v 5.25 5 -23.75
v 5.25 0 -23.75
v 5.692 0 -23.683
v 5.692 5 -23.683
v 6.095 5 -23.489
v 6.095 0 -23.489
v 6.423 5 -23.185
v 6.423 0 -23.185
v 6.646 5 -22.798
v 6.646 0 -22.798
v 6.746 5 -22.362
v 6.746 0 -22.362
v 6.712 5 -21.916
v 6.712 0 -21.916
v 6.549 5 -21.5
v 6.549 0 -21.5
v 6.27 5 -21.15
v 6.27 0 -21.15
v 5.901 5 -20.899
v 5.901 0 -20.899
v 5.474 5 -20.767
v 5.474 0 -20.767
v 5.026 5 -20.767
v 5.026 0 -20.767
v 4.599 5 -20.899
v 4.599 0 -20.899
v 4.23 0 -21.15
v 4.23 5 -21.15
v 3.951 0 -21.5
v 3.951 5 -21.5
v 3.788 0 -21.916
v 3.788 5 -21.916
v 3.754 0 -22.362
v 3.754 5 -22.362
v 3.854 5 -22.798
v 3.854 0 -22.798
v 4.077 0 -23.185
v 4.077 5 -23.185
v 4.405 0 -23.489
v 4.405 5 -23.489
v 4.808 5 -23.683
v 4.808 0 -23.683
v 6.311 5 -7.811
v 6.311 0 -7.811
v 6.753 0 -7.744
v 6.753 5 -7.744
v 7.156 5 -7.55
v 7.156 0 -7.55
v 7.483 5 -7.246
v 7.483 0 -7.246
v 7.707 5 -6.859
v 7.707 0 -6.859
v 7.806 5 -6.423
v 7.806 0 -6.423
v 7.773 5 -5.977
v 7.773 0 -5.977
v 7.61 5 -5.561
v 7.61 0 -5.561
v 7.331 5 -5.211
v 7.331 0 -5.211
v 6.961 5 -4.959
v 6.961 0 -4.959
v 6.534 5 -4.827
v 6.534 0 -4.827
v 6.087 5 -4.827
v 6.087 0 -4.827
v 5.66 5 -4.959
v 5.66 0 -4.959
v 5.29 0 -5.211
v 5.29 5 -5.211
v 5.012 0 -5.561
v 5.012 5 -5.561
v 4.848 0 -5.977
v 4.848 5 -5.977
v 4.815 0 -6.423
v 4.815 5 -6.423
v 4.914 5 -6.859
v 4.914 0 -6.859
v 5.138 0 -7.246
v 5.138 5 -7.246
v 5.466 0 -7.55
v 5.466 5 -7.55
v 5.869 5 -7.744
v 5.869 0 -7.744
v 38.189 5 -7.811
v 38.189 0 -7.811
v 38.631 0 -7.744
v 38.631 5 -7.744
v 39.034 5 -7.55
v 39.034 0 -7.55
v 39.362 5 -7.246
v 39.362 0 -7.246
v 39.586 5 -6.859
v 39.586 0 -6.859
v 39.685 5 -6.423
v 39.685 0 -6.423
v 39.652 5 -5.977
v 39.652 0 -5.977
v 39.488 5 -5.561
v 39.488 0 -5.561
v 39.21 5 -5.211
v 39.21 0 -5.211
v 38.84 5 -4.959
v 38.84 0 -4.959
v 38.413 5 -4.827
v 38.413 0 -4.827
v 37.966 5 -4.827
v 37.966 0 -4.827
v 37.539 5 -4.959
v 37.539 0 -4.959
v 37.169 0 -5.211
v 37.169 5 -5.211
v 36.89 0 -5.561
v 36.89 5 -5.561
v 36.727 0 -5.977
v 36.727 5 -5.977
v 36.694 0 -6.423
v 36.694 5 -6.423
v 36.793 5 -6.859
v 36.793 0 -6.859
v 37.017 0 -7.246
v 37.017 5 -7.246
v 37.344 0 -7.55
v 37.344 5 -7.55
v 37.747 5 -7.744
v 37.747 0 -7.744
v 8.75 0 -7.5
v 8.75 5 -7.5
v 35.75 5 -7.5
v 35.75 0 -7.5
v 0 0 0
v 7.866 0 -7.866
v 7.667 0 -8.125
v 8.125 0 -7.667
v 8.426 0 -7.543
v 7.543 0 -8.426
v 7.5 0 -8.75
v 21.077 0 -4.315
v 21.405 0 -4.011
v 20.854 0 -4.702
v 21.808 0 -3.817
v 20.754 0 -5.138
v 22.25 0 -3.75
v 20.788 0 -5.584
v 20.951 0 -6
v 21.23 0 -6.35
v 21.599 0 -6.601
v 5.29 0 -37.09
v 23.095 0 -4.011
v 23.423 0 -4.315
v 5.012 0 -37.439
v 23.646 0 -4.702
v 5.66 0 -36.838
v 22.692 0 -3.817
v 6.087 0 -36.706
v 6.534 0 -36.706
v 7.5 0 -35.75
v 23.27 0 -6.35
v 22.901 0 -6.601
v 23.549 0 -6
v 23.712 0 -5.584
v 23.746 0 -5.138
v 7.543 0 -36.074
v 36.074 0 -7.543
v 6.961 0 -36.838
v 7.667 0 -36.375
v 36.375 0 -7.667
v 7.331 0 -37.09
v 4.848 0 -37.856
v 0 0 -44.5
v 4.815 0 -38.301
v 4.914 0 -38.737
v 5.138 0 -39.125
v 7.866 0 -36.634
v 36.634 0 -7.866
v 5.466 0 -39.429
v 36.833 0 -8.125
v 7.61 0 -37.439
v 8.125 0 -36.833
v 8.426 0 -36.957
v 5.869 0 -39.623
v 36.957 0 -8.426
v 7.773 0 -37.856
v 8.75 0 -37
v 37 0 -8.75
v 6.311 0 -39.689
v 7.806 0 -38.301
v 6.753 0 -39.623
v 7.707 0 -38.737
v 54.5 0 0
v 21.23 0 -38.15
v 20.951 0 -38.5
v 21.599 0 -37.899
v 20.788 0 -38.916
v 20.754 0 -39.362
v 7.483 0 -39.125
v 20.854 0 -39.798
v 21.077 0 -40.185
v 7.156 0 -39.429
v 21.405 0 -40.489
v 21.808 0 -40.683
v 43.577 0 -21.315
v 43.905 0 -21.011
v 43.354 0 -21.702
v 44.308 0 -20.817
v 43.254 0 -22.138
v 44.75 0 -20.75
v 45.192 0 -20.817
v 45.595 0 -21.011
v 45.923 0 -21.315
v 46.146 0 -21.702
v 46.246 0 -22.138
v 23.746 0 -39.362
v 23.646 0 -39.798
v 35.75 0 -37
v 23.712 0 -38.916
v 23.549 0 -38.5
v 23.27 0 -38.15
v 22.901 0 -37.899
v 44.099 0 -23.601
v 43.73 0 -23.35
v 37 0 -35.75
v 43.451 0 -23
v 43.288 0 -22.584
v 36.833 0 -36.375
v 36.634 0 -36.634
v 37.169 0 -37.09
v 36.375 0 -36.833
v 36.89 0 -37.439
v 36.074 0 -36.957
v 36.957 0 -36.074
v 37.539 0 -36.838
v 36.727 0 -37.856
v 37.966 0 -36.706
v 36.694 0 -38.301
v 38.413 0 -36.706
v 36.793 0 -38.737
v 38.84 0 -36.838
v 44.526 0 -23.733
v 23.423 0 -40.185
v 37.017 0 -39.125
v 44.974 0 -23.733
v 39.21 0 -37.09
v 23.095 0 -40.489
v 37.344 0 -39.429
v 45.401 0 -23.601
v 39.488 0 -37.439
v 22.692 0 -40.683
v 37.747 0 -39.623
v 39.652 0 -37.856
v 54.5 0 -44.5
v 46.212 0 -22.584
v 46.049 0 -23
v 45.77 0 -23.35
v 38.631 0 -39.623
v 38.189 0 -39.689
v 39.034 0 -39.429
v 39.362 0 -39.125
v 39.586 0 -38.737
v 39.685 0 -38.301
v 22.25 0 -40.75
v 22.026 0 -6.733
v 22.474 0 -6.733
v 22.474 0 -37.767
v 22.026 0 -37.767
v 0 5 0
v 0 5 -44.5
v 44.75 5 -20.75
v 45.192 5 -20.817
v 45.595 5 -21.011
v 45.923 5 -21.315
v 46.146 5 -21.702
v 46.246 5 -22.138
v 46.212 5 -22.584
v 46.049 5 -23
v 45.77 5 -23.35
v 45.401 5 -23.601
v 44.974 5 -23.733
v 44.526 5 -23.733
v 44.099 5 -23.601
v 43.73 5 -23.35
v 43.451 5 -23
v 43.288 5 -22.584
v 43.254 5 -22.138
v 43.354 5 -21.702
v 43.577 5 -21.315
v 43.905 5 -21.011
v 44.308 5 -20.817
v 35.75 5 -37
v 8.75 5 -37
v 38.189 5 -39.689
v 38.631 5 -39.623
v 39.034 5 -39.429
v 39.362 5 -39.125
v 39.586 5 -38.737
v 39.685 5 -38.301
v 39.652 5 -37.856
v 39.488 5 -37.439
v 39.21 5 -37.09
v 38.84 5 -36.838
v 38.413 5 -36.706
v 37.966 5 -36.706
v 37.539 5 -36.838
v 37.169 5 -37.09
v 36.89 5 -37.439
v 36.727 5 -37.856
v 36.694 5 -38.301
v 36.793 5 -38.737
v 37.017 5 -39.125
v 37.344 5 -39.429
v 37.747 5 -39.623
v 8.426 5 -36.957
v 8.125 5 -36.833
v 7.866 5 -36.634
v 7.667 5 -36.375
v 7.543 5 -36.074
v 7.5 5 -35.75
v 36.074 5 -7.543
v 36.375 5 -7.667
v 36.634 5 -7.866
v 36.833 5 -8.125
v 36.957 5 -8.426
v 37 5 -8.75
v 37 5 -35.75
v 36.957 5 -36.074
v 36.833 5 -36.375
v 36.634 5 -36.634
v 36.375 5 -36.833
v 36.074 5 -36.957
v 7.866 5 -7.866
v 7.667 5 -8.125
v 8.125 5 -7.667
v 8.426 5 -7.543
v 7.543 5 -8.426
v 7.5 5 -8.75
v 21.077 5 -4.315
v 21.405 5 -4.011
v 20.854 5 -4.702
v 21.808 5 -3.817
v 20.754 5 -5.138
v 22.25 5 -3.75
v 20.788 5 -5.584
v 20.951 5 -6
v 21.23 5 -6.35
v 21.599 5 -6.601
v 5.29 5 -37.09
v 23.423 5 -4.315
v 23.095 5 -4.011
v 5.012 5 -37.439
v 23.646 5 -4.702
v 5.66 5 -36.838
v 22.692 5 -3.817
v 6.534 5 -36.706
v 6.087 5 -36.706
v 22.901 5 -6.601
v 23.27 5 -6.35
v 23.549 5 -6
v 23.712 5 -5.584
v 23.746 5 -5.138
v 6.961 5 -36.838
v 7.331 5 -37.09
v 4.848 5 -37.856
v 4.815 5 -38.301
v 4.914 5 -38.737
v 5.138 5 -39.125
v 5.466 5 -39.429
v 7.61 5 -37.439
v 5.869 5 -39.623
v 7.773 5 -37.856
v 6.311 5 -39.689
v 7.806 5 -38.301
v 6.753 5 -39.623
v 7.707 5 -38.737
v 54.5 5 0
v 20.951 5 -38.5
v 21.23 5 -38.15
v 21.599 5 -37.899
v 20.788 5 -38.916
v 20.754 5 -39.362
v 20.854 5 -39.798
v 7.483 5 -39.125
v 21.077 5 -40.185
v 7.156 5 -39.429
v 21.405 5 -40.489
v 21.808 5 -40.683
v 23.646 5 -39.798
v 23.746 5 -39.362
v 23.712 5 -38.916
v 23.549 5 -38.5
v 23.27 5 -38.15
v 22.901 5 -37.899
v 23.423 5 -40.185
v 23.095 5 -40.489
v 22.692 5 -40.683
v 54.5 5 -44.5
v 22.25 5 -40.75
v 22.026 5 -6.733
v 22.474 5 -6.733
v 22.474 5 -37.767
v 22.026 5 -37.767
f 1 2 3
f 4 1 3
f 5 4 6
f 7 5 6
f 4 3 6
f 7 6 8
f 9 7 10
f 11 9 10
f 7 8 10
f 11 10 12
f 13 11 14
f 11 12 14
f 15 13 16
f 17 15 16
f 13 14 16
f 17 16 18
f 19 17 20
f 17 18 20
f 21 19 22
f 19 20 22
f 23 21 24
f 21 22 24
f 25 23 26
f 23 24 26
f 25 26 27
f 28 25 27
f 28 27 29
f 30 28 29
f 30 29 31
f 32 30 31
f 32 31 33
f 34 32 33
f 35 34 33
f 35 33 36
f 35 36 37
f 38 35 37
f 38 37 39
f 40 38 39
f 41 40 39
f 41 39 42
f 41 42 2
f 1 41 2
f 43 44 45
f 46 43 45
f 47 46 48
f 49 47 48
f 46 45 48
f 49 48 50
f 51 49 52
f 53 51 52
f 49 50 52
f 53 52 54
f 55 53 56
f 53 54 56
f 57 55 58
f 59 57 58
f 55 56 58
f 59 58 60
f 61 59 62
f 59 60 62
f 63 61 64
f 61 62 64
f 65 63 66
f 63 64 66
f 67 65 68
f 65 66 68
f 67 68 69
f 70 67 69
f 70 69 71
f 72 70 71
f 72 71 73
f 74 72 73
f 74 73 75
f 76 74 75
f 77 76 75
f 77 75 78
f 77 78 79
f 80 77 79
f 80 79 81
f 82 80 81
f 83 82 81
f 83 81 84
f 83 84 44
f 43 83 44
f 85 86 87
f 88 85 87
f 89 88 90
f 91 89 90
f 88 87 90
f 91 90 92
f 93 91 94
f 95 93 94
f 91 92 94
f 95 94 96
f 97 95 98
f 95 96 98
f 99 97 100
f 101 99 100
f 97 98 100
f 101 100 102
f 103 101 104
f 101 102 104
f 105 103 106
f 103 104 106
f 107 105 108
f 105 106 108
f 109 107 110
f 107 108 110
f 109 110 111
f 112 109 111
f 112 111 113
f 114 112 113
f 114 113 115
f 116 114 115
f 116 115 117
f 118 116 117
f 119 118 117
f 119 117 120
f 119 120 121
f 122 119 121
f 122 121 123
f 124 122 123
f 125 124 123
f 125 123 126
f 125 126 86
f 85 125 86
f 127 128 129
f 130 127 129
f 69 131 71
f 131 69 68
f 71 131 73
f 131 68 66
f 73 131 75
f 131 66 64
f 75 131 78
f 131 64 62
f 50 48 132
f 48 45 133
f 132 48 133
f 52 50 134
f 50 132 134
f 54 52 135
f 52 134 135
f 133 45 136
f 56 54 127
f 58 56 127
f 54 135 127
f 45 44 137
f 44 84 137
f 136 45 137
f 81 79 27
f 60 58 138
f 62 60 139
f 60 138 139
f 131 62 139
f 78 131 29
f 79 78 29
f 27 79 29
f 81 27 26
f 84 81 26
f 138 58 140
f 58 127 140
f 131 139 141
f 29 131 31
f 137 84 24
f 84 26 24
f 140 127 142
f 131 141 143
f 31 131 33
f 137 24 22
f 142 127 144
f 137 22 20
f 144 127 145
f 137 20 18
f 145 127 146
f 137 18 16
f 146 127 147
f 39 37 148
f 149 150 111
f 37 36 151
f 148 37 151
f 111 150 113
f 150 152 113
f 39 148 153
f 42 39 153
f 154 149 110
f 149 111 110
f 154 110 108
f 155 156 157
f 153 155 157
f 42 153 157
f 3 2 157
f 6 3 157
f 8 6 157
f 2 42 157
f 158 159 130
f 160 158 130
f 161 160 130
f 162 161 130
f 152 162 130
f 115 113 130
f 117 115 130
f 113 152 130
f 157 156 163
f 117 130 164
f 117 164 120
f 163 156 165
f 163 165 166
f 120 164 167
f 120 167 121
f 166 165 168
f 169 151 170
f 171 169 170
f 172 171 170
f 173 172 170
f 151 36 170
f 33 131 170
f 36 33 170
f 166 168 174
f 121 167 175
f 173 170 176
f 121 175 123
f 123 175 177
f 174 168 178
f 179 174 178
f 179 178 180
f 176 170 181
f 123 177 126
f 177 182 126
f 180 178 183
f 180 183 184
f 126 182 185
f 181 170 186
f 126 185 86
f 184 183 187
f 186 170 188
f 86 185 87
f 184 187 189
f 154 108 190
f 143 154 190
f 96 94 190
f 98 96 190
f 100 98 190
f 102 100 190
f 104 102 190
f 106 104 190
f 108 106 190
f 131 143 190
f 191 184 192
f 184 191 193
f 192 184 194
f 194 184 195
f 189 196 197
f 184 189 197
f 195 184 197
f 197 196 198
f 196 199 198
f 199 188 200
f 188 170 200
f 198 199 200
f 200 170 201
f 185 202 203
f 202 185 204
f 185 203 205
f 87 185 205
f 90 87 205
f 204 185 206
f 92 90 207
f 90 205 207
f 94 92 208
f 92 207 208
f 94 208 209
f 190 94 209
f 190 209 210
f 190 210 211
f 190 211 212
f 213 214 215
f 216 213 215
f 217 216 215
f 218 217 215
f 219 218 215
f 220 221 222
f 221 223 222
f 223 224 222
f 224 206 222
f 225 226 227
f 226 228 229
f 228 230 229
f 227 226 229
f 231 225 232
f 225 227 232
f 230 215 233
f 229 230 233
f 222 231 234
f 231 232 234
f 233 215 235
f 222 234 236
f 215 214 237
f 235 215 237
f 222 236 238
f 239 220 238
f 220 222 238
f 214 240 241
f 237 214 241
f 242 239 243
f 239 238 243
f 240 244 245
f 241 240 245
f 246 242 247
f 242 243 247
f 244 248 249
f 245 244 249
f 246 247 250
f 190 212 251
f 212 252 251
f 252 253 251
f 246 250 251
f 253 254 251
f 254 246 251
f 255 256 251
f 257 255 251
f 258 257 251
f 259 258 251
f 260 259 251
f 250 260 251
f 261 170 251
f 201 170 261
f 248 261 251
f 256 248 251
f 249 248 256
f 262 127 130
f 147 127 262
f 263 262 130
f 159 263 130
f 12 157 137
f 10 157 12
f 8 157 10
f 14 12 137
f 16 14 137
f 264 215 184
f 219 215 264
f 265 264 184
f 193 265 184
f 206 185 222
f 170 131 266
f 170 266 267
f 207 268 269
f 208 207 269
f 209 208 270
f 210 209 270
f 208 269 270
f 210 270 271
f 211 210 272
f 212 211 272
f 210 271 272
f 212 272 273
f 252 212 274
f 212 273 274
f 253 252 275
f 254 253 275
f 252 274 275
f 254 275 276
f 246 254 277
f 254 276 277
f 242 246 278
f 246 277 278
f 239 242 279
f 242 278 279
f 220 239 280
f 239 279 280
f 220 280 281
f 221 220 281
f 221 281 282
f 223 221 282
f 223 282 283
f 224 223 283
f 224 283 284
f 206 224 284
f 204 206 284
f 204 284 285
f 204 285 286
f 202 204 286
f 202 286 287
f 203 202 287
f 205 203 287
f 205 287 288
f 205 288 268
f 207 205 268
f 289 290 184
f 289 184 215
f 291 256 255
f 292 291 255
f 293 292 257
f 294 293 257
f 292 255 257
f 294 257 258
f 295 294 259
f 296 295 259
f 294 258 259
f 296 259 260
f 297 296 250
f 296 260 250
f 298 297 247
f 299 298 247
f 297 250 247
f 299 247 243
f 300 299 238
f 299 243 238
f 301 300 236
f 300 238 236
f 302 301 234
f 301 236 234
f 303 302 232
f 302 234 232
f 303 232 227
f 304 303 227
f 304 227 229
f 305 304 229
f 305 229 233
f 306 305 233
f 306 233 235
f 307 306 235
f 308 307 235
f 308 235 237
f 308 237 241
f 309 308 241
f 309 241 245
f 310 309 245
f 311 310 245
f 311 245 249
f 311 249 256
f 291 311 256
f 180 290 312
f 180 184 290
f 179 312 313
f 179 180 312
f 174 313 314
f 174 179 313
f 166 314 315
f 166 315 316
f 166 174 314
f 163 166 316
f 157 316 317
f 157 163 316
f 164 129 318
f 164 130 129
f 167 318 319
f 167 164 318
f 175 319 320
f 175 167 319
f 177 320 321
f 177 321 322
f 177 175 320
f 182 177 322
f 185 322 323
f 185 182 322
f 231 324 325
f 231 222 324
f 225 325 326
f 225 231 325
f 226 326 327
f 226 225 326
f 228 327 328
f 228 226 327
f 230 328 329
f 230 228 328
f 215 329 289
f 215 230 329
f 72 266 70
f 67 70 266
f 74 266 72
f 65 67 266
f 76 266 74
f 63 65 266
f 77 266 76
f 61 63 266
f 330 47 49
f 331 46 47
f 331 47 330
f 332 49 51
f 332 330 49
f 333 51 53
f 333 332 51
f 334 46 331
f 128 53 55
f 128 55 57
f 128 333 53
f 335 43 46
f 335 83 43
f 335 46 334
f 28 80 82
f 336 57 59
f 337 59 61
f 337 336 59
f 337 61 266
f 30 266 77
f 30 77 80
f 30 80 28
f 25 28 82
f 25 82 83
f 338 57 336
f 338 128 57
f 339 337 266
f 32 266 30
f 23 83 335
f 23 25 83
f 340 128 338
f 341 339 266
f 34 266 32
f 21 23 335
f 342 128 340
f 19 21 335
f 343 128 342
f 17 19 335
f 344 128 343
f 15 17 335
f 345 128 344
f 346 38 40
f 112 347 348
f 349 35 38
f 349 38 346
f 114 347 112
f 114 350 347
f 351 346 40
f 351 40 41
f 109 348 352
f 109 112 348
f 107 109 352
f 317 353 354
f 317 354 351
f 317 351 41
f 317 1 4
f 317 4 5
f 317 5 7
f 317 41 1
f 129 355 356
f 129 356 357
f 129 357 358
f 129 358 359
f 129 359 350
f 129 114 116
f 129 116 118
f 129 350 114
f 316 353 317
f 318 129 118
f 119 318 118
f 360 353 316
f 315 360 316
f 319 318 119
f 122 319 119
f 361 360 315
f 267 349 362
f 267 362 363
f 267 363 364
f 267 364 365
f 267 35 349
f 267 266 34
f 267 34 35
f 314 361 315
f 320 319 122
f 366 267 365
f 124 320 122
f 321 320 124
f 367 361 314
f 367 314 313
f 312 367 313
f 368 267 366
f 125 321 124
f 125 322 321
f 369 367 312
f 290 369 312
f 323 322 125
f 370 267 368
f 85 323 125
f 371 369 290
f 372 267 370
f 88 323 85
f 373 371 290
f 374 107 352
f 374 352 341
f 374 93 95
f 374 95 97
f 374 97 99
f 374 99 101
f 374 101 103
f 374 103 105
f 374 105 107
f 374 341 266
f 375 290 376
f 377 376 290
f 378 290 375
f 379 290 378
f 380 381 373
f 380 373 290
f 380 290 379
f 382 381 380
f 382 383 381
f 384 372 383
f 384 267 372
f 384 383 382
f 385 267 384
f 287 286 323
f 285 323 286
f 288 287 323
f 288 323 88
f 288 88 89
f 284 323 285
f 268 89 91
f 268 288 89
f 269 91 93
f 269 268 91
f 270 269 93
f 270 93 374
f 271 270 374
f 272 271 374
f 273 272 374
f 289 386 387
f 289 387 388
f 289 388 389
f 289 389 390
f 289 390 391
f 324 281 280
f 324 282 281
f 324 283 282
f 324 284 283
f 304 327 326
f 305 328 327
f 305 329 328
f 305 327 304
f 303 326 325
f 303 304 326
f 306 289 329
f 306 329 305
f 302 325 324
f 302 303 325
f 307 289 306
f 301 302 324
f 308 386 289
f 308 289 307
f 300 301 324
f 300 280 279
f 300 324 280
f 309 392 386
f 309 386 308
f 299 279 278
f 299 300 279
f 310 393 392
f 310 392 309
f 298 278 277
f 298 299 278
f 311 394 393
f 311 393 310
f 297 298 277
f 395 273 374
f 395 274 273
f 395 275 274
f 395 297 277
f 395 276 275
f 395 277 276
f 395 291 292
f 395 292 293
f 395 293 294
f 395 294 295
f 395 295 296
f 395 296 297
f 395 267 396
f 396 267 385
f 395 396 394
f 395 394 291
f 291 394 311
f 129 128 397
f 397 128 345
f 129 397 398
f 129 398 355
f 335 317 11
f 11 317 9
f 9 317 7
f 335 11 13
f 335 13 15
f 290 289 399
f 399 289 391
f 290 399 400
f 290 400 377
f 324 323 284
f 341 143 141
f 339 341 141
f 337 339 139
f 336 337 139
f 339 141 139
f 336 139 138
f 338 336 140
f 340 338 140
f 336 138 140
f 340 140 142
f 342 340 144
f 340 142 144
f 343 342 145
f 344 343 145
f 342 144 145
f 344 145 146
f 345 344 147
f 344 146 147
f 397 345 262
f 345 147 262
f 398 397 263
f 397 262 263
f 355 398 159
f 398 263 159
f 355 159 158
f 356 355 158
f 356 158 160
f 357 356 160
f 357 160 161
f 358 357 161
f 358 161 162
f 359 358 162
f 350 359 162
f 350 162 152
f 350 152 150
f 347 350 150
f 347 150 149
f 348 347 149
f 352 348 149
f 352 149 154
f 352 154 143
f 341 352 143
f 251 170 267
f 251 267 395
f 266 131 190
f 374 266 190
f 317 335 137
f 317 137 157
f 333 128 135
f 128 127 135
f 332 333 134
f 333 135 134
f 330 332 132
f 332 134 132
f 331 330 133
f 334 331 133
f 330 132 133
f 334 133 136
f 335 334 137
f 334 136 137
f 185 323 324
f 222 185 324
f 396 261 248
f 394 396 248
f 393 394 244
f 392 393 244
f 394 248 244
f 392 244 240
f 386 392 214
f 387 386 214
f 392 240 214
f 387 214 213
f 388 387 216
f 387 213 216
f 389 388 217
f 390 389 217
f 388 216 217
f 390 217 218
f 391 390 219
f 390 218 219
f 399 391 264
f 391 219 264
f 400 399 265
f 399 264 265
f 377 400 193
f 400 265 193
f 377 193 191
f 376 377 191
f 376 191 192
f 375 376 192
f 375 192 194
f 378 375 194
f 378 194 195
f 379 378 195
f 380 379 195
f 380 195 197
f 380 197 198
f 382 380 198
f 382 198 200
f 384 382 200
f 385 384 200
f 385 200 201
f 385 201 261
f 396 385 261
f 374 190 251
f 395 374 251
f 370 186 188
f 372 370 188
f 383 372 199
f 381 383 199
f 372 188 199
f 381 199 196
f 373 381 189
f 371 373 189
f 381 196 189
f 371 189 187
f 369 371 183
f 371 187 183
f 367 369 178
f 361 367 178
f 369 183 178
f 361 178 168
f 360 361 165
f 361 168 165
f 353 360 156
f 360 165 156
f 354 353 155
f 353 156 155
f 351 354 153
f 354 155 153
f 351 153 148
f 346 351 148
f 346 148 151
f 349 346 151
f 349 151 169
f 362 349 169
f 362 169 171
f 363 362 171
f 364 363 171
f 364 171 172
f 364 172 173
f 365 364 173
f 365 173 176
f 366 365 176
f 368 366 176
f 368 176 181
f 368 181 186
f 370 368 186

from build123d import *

# Parameters (mm, degrees)
SKETCH_1_W          = 54.5
SKETCH_1_H          = 44.5
EXTRUDE_1_DEPTH     = 5
SKETCH_2_W          = 29.5
SKETCH_2_H          = 29.5
CUT_EXTRUDE_1_DEPTH = 71.537224215
FILLET_1_R          = 1.25
SKETCH_4_R          = 1.5
CUT_EXTRUDE_2_DEPTH = 71.537224215
SKETCH_7_R          = 1.5
CUT_EXTRUDE_3_DEPTH = 71.537224215


with BuildPart() as part:
    # Эскиз1 → Бобышка-Вытянуть1 (new body)
    with BuildSketch(Plane(origin=(0, 0, 0), x_dir=(1, 0, 0), z_dir=(0, 1, 0))):
        with Locations((27.25, 22.25)):
            Rectangle(SKETCH_1_W, SKETCH_1_H)
    extrude(amount=EXTRUDE_1_DEPTH)

    # Эскиз2 → Вырез-Вытянуть1 (cut, through all)
    with BuildSketch(Plane(origin=(0, 5, 0), x_dir=(1, 0, 0), z_dir=(0, 1, 0))):
        with Locations((22.25, 22.25)):
            Rectangle(SKETCH_2_W, SKETCH_2_H)
    extrude(amount=-CUT_EXTRUDE_1_DEPTH, mode=Mode.SUBTRACT)

    # Скругление1
    fillet_1_edges = [part.edges().sort_by_distance(p)[0] for p in [
        (7.5, 2.5, -7.5),
        (7.5, 2.5, -37),
        (37, 2.5, -37),
        (37, 2.5, -7.5),
    ]]
    fillet(fillet_1_edges, radius=FILLET_1_R)

    # Эскиз4 → Вырез-Вытянуть2 (cut, through all)
    with BuildSketch(Plane(origin=(0, 5, 0), x_dir=(1, 0, 0), z_dir=(0, 1, 0))):
        with Locations(Location((44.75, 22.25, 0), (0, 0, 270))):
            Circle(SKETCH_4_R)
    extrude(amount=-CUT_EXTRUDE_2_DEPTH, mode=Mode.SUBTRACT)

    # Эскиз7 → Вырез-Вытянуть3 (cut, through all)
    with BuildSketch(Plane.XZ):
        with Locations(Location((6.310660172, -38.189339828, 0), (0, 0, 270))):
            Circle(SKETCH_7_R)
        with Locations(Location((38.189339828, -38.189339828, 0), (0, 0, 270))):
            Circle(SKETCH_7_R)
        with Locations(Location((6.310660172, -6.310660172, 0), (0, 0, 270))):
            Circle(SKETCH_7_R)
        with Locations(Location((38.189339828, -6.310660172, 0), (0, 0, 270))):
            Circle(SKETCH_7_R)
        with Locations(Location((22.25, -39.25, 0), (0, 0, 270))):
            Circle(SKETCH_7_R)
        with Locations(Location((5.25, -22.25, 0), (0, 0, 270))):
            Circle(SKETCH_7_R)
        with Locations(Location((22.25, -5.25, 0), (0, 0, 90))):
            Circle(SKETCH_7_R)
    extrude(amount=-CUT_EXTRUDE_3_DEPTH, mode=Mode.SUBTRACT)


solid = part.part
